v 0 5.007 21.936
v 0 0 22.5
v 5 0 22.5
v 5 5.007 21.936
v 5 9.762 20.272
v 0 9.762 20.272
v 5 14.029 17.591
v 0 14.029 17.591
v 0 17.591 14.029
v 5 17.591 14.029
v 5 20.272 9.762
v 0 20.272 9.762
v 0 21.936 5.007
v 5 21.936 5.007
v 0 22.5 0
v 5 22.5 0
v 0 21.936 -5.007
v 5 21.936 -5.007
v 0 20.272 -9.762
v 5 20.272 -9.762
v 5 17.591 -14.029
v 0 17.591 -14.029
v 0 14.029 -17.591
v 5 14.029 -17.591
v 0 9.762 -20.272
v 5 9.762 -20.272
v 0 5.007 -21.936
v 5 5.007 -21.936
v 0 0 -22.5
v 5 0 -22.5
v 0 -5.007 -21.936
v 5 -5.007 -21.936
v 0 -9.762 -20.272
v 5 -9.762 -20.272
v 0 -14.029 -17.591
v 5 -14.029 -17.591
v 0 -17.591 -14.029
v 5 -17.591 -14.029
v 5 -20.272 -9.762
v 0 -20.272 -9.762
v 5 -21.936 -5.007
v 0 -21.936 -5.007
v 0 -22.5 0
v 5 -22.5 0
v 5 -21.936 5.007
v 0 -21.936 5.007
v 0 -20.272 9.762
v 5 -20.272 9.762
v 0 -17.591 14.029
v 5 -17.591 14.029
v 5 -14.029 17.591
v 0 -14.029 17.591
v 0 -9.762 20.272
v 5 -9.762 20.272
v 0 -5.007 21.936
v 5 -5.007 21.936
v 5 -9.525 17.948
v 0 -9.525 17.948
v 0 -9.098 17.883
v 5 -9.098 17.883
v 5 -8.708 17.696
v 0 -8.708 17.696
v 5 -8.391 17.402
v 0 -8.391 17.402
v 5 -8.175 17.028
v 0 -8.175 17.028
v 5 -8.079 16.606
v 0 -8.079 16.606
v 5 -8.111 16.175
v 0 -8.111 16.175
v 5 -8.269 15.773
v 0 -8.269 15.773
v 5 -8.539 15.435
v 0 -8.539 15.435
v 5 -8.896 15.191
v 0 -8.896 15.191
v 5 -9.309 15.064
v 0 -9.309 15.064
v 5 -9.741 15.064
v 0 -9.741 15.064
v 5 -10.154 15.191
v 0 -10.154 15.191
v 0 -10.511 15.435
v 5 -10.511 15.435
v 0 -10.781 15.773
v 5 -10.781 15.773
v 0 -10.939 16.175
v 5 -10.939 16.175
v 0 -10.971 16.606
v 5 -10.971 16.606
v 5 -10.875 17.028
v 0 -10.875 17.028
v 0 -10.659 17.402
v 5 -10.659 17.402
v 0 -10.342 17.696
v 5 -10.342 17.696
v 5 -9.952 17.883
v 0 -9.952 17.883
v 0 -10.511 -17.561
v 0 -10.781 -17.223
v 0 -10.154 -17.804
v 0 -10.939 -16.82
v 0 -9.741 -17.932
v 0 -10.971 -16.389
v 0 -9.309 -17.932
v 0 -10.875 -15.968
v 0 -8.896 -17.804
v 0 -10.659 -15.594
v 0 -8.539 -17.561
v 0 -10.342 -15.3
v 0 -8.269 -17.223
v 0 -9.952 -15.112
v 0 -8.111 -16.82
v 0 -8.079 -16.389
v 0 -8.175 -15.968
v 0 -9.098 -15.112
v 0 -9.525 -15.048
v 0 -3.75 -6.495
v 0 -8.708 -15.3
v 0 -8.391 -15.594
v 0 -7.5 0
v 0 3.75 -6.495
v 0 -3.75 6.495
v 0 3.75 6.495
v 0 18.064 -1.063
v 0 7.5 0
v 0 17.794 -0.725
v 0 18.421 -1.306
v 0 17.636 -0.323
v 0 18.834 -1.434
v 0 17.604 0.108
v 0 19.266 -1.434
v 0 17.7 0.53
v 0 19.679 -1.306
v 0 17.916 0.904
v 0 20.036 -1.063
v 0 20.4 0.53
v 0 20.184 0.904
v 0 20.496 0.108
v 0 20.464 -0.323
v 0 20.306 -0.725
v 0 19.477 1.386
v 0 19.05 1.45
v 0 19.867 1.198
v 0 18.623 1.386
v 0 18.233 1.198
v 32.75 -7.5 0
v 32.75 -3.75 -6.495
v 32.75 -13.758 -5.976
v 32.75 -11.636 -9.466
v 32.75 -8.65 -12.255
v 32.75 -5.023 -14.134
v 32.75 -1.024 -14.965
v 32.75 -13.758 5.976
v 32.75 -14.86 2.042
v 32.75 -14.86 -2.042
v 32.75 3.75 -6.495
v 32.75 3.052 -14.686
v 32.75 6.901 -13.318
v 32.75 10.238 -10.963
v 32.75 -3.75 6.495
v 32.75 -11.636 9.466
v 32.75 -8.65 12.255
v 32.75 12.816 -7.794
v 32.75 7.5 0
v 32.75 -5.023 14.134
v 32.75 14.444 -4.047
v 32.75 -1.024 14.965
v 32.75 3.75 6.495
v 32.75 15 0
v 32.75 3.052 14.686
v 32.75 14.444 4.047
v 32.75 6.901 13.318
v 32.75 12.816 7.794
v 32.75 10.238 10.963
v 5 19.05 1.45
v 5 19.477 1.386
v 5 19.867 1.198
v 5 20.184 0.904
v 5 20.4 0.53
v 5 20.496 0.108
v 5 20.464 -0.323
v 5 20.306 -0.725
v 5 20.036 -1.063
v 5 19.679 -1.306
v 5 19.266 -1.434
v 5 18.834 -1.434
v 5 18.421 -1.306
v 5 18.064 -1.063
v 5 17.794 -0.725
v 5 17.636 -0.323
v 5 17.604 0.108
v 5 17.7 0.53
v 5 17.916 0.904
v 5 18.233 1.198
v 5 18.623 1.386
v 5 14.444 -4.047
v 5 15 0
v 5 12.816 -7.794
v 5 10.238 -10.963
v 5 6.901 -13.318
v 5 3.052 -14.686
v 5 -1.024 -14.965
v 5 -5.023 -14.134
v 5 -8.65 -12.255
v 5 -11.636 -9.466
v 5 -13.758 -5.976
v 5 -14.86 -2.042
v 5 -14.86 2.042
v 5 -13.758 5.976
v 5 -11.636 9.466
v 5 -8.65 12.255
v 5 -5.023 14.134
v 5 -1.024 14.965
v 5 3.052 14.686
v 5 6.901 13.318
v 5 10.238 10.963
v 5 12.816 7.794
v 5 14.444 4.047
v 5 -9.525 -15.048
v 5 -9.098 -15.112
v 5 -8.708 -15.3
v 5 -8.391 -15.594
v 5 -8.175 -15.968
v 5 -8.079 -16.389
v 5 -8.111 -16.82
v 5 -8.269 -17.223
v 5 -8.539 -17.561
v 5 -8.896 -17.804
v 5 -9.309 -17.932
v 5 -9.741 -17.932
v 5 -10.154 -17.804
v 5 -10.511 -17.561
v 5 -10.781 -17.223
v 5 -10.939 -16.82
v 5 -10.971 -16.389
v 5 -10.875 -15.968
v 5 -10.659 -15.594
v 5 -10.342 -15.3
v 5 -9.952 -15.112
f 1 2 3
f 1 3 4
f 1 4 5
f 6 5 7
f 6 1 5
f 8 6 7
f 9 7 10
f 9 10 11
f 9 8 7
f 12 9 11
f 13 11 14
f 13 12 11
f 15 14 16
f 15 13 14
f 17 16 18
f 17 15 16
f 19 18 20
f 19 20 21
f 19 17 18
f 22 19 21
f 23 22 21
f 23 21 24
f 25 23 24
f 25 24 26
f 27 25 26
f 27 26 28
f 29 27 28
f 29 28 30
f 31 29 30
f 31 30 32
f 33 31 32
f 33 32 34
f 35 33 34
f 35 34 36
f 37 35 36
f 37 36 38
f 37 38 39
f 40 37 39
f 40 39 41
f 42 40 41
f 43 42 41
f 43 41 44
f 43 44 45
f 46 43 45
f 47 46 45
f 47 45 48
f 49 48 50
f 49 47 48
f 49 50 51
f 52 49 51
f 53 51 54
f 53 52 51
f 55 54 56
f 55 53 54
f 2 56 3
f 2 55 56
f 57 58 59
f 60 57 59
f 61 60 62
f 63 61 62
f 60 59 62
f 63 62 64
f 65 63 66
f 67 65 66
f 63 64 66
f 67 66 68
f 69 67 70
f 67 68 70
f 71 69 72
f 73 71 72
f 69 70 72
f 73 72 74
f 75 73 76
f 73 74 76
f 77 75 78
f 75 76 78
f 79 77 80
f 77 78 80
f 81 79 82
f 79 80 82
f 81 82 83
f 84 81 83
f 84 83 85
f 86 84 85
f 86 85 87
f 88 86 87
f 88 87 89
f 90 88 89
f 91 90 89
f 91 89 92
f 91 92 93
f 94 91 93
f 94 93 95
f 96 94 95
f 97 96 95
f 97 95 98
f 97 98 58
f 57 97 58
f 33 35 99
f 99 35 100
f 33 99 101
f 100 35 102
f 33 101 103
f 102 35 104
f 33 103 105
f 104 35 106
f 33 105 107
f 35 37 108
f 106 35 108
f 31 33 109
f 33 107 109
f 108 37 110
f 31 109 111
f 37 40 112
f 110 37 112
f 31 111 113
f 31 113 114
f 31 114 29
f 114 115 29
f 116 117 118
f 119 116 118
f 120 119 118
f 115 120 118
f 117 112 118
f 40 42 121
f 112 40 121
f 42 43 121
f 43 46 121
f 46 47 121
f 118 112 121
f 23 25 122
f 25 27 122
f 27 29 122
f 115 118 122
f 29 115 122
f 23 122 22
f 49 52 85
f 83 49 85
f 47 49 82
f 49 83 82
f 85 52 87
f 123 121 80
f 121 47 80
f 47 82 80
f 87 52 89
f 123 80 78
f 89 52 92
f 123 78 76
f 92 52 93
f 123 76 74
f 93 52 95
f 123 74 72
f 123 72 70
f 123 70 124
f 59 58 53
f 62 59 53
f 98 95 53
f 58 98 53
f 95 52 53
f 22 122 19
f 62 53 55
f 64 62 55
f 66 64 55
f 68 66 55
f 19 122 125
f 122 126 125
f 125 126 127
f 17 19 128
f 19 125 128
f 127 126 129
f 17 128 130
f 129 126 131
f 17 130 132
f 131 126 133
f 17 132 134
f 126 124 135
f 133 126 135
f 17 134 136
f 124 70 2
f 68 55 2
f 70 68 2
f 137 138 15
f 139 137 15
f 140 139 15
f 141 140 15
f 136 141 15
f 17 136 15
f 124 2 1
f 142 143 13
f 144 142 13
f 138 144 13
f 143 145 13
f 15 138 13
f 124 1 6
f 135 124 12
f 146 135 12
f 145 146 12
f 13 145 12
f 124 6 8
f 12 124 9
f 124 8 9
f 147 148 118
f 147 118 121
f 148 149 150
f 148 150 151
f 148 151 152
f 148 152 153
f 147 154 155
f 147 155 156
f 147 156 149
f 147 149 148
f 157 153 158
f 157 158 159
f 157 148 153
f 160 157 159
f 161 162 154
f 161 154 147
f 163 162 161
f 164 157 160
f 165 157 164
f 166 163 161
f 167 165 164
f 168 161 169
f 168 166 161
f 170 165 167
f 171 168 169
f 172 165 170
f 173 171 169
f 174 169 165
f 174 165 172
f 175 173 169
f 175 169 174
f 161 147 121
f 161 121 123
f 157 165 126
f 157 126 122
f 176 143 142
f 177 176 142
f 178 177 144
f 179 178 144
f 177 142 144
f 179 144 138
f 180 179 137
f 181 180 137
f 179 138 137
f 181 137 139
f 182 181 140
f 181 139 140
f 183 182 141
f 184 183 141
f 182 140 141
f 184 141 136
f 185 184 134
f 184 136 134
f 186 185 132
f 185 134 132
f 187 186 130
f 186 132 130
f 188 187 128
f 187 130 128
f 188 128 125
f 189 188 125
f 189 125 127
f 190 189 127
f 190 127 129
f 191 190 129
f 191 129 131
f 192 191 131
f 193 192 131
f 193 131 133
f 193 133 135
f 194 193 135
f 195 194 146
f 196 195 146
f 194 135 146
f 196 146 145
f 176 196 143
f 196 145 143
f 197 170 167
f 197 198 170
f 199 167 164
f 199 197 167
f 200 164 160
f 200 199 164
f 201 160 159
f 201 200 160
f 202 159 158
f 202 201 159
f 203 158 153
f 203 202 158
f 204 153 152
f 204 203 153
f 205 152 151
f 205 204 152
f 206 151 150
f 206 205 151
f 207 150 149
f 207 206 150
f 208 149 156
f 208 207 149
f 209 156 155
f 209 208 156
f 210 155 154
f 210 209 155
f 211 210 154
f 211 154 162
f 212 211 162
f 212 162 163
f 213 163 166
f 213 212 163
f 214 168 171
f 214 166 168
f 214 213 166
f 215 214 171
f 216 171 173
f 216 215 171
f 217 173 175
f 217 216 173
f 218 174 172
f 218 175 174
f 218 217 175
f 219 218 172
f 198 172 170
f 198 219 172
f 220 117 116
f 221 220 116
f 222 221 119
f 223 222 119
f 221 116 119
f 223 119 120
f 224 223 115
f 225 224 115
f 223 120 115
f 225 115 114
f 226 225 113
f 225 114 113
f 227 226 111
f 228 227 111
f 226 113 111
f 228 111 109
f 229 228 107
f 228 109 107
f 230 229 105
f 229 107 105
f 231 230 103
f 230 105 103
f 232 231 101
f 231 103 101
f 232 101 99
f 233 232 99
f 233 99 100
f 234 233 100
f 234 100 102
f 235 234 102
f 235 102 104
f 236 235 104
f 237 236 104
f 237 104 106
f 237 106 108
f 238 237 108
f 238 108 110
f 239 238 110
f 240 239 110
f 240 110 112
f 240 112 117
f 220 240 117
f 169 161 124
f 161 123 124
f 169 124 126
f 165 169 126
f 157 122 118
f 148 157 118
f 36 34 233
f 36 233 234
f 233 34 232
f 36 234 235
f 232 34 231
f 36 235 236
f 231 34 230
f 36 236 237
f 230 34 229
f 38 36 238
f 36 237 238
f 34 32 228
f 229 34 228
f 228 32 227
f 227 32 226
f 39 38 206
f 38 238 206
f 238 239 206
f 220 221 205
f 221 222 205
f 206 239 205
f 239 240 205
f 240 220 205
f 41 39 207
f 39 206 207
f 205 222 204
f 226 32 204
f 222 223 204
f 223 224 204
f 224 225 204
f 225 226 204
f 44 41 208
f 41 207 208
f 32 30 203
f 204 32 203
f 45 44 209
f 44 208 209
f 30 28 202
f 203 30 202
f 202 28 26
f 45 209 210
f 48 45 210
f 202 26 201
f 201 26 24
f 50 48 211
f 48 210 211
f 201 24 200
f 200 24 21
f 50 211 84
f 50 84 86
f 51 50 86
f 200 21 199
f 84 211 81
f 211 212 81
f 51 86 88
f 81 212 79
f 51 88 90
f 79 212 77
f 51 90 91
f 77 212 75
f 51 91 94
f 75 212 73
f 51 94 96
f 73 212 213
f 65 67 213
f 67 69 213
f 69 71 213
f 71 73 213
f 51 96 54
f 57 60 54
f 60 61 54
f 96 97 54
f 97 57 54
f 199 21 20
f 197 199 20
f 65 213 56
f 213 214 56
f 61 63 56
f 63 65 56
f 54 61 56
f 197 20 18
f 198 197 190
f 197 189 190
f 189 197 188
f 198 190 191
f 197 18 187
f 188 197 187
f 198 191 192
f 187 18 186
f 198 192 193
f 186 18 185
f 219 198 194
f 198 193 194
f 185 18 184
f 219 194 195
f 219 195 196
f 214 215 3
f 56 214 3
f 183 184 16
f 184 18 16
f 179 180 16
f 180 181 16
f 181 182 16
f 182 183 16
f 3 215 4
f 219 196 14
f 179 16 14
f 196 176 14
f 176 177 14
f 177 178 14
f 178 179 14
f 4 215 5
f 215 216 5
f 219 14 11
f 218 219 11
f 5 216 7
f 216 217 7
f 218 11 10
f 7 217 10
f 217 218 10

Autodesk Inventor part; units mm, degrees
ref_plane "YZ Plane" through (0, 0, 0) normal (1, 0, 0) x (0, 1, 0)
ref_plane "XZ Plane" through (0, 0, 0) normal (0, 1, 0) x (-1, 0, 0)
ref_plane "XY Plane" through (0, 0, 0) normal (0, 0, 1) x (1, 0, 0)
sketch "Sketch1" plane through (0, 0, 0) normal (1, 0, 0) x (0, 1, 0)
  circle A0 centre (0, 0) radius 15
  line L0 (0, 0) -> (7.5, 0)
  line L1 (7.5, 0) -> (3.75, -6.4952)
  line L2 (3.75, -6.4952) -> (-3.75, -6.4952)
  line L3 (-3.75, -6.4952) -> (-7.5, 0)
  line L4 (-7.5, 0) -> (-3.75, 6.4952)
  line L5 (-3.75, 6.4952) -> (3.75, 6.4952)
  line L6 (3.75, 6.4952) -> (7.5, 0)
  dimension "d0" = 30
  dimension "d1" = 7.5
extrude "Extrusion1" add sketch "Sketch1" along normal blind 32.75
sketch "Sketch2" plane through (0, 0, 0) normal (-1, 0, 0) x (0, 0, 1)
  circle A0 centre (0, 0) radius 22.5
  line L0 (0, 7.5) -> (-6.4952, 3.75) projected
  line L1 (-6.4952, 3.75) -> (-6.4952, -3.75) projected
  line L2 (-6.4952, -3.75) -> (0, -7.5) projected
  line L3 (0, -7.5) -> (6.4952, -3.75) projected
  line L4 (6.4952, -3.75) -> (6.4952, 3.75) projected
  line L5 (6.4952, 3.75) -> (0, 7.5) projected
  dimension "d4" = 45
extrude "Extrusion2" add sketch "Sketch2" against normal blind 5
sketch "Sketch3" plane through (0, 0, 0) normal (-1, 0, 0) x (0, 0, 1)
  circle A0 centre (0, 19.05) radius 1.45
  circle A1 centre (-16.4978, -9.525) radius 1.45
  circle A2 centre (16.4978, -9.525) radius 1.45
  point P0 (0, 0)
  dimension "d11" = 360
extrude "Extrusion3" cut sketch "Sketch3" against normal up to surface (5 mm away)
sketch "Sketch4" plane through (0, 0, 0) normal (-1, 0, 0) x (0, 0, 1)
  line L0 (6.4952, 3.75) -> (0, 7.5) projected
  circle A0 centre (0, 0) radius 7.5
properties part number "wheel_gearing_mount_long"
